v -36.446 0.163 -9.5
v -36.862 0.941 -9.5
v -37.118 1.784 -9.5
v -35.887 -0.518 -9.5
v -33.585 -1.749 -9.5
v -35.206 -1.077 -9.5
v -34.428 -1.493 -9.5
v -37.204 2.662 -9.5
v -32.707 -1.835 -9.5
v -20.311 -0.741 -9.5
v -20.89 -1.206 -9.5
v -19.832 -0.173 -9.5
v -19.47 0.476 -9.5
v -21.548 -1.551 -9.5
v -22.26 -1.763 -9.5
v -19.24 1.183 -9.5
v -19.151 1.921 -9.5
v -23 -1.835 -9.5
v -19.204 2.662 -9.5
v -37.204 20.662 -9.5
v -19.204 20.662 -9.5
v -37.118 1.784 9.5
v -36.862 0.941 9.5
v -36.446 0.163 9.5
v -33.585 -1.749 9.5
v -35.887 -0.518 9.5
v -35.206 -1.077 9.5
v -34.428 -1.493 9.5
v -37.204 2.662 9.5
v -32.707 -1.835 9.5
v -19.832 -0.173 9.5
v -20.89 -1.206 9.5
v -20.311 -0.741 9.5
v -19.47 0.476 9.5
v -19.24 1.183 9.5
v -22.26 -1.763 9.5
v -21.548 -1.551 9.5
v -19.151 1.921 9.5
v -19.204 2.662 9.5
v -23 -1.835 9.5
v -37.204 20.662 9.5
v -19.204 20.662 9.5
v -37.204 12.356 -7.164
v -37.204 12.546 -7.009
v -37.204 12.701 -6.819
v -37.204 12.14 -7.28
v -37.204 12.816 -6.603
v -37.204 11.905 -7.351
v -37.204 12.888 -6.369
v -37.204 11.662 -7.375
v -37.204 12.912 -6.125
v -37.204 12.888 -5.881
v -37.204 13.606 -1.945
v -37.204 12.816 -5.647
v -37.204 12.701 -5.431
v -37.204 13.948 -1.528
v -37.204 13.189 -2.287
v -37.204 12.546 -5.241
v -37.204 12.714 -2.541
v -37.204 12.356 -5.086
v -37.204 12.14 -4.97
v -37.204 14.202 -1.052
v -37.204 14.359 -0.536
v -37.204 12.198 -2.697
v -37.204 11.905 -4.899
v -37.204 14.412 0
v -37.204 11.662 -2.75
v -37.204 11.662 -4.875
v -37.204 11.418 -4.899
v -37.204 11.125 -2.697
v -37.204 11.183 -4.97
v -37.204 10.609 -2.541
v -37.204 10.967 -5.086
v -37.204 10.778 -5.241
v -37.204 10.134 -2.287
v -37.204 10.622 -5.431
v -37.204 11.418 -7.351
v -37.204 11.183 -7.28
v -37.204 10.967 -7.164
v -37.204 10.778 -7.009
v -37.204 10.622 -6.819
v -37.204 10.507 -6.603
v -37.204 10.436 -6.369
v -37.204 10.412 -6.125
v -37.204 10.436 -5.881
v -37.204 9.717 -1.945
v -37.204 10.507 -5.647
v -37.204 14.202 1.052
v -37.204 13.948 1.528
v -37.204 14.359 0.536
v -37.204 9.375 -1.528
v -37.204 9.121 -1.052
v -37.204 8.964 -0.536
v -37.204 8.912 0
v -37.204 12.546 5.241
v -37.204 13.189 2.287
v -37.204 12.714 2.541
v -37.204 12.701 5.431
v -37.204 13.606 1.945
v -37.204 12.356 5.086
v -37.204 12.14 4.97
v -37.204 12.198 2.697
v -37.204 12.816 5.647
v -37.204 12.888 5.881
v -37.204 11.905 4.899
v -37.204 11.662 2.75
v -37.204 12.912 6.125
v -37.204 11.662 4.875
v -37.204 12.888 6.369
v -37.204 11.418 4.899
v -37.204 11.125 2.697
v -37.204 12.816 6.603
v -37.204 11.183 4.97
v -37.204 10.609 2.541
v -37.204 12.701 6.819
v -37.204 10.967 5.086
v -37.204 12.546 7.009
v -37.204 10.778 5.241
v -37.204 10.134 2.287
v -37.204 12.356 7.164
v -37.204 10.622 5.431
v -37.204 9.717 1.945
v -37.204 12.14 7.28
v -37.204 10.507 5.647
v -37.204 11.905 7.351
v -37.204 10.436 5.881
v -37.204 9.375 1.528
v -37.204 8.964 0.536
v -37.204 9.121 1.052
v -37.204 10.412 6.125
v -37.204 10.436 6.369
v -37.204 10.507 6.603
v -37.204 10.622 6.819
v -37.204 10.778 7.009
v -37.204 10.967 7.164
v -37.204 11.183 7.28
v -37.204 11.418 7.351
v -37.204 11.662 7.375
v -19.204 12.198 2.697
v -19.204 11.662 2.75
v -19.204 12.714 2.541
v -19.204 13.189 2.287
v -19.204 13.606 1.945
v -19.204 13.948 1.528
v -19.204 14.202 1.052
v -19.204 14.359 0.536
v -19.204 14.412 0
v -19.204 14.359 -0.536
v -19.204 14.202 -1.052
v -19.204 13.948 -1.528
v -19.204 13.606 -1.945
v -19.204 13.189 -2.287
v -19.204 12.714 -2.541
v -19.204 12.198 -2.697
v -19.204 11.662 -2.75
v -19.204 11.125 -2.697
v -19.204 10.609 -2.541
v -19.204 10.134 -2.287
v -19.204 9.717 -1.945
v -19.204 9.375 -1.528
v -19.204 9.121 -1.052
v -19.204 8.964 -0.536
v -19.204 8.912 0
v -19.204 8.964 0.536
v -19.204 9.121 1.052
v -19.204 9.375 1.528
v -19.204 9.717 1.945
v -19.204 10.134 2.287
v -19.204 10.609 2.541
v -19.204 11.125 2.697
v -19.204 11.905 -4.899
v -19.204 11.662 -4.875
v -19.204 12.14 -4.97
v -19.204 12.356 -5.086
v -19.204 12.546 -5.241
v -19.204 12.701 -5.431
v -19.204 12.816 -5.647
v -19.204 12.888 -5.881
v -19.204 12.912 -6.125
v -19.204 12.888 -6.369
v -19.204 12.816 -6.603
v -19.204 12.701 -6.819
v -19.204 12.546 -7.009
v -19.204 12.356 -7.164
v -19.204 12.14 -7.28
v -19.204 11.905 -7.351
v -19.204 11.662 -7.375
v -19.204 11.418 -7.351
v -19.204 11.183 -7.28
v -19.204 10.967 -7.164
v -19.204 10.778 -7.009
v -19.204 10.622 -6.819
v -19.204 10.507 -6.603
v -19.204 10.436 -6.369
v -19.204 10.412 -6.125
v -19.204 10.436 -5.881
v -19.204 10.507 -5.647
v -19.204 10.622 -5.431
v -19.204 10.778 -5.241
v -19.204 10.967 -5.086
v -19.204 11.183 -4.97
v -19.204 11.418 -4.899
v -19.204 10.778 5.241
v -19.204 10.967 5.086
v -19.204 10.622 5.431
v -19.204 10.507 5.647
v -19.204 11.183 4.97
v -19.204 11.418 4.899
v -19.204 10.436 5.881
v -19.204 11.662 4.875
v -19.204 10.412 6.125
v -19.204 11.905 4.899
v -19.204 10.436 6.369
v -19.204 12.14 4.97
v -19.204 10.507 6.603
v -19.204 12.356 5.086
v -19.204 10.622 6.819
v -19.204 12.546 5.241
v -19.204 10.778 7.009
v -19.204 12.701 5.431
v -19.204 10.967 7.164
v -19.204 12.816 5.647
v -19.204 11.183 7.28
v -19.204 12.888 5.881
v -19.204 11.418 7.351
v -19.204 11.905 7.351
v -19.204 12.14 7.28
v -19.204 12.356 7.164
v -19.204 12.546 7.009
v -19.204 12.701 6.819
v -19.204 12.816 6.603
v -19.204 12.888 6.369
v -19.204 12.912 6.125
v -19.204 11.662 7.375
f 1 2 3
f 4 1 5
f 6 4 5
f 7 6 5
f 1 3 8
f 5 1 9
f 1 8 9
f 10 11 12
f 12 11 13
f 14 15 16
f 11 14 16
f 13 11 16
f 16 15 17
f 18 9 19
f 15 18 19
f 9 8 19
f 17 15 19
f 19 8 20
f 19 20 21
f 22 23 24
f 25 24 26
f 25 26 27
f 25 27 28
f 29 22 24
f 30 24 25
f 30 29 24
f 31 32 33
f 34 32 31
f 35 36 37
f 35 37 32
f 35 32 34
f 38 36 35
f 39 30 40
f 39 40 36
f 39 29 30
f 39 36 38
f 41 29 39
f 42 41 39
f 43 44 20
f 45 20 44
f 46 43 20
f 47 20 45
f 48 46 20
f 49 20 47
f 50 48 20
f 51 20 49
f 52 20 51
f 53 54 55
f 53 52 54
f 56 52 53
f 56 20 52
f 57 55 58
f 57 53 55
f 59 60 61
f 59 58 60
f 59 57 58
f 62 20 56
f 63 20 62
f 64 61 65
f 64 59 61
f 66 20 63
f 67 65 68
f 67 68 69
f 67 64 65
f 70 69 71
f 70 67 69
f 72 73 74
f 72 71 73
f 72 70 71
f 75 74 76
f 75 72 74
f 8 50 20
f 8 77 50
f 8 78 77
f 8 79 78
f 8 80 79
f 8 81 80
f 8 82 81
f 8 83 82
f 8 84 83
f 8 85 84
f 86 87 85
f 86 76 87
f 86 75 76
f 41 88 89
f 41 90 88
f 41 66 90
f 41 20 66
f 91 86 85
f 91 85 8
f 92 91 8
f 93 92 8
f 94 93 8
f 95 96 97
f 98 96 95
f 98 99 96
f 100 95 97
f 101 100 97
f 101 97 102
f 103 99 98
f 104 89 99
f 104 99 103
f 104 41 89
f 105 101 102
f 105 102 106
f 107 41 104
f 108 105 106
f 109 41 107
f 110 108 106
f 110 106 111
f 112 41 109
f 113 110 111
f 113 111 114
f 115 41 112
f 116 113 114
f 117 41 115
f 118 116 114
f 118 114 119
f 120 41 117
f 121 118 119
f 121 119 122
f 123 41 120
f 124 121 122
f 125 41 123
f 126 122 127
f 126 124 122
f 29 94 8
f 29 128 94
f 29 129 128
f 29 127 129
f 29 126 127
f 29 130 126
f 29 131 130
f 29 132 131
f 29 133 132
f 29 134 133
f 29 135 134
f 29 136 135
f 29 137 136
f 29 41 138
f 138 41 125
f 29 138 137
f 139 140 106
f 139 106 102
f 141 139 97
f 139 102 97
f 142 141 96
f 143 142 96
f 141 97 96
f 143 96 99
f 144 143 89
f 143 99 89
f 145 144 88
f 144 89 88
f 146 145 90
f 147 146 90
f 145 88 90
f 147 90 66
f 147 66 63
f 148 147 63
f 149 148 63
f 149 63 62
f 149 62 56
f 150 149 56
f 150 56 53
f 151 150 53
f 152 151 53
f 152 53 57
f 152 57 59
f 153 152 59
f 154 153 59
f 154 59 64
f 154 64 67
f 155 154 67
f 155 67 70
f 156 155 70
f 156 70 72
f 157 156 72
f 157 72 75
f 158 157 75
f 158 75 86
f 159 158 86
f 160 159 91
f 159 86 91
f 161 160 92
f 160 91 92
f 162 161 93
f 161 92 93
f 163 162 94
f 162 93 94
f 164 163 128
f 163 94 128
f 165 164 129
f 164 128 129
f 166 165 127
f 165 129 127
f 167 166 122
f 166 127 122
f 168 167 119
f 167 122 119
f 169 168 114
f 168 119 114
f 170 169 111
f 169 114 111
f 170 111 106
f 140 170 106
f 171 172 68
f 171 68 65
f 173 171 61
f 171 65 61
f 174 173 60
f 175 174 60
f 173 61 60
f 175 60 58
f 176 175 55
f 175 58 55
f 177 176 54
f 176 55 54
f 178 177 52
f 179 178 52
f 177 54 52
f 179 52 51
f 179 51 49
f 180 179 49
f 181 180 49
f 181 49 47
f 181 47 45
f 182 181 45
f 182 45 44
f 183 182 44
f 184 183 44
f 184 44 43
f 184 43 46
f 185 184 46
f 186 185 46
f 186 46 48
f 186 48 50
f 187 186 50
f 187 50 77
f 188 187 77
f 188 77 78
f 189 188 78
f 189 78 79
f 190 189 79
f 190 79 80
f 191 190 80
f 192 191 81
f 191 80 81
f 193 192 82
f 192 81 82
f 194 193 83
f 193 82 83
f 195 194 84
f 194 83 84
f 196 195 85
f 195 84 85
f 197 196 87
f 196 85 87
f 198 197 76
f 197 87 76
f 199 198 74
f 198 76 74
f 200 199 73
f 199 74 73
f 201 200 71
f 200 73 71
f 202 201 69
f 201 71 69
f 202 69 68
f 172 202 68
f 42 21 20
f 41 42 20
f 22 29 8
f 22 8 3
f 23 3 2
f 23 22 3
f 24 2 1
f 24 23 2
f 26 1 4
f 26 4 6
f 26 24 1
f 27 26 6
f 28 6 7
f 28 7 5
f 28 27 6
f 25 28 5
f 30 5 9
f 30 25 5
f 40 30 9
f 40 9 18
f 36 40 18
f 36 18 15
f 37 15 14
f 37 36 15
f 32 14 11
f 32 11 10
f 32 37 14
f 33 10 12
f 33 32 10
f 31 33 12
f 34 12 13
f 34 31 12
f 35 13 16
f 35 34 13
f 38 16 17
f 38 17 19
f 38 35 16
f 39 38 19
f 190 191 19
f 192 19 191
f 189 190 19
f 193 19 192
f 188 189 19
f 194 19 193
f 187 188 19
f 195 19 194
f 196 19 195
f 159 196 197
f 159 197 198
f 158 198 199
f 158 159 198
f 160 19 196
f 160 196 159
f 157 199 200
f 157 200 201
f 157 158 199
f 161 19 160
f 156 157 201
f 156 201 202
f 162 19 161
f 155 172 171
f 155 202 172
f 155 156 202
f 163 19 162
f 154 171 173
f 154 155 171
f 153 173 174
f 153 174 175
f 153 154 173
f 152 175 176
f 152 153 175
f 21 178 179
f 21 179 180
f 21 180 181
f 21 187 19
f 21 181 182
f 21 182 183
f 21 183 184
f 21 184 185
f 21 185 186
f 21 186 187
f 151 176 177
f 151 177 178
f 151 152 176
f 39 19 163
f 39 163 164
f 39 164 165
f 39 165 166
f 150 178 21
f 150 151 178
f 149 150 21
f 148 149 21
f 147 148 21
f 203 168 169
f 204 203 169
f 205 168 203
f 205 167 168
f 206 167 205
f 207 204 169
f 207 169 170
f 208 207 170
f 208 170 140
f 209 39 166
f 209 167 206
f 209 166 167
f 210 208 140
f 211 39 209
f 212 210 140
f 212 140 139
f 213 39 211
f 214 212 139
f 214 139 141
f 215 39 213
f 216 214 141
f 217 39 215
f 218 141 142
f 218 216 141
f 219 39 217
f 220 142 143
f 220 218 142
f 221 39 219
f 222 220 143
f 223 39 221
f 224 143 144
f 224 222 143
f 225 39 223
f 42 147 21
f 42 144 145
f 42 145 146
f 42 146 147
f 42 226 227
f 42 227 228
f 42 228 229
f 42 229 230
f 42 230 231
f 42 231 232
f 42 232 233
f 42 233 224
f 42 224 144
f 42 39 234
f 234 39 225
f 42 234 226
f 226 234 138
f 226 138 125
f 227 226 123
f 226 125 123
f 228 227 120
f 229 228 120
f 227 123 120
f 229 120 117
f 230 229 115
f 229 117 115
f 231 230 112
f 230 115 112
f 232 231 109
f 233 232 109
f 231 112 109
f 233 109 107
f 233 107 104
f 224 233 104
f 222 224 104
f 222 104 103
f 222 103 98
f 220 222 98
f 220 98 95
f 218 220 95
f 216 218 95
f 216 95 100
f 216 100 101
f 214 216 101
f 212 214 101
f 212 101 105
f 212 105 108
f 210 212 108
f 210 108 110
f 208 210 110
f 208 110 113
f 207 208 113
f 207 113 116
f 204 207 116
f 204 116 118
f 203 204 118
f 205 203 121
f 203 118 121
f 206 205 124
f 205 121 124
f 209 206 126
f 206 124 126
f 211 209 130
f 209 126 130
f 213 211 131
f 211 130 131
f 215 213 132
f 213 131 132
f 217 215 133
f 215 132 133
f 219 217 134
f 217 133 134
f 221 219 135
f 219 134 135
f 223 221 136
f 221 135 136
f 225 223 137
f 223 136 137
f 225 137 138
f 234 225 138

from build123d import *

# Parameters (mm, degrees)
BOSS_EXTRUDE1_DEPTH = 9.5
SKETCH3_R           = 2.75
SKETCH3_R_2         = 1.25
CUT_EXTRUDE1_DEPTH  = 19.054661658


with BuildPart() as part:
    # Sketch2 → Boss-Extrude1 (new body, symmetric)
    with BuildSketch(Plane.XY):
        with BuildLine():
            Line((-37.204062484, 20.661621188), (-37.204062484, 2.661621188))
            ThreePointArc((-37.204062484, 2.661621188), (-35.886988122, -0.518077598), (-32.707289335, -1.83515196))
            Line((-32.707289335, -1.83515196), (-22.999692171, -1.83515196))
            ThreePointArc((-22.999692171, -1.83515196), (-20.057423766, -0.468366217), (-19.204062484, 2.661621188))
            Line((-19.204062484, 2.661621188), (-19.204062484, 20.661621188))
            Line((-19.204062484, 20.661621188), (-37.204062484, 20.661621188))
        make_face()
    extrude(amount=BOSS_EXTRUDE1_DEPTH, both=True)

    # Sketch3 → Cut-Extrude1 (cut, through all)
    with BuildSketch(Plane.ZY.offset(37.204062484)):
        with Locations((0, 11.661621188)):
            Circle(SKETCH3_R)
        with Locations((6.125, 11.661621188)):
            Circle(SKETCH3_R_2)
        with Locations((-6.125, 11.661621188)):
            Circle(SKETCH3_R_2)
    extrude(amount=-CUT_EXTRUDE1_DEPTH, mode=Mode.SUBTRACT)


solid = part.part
